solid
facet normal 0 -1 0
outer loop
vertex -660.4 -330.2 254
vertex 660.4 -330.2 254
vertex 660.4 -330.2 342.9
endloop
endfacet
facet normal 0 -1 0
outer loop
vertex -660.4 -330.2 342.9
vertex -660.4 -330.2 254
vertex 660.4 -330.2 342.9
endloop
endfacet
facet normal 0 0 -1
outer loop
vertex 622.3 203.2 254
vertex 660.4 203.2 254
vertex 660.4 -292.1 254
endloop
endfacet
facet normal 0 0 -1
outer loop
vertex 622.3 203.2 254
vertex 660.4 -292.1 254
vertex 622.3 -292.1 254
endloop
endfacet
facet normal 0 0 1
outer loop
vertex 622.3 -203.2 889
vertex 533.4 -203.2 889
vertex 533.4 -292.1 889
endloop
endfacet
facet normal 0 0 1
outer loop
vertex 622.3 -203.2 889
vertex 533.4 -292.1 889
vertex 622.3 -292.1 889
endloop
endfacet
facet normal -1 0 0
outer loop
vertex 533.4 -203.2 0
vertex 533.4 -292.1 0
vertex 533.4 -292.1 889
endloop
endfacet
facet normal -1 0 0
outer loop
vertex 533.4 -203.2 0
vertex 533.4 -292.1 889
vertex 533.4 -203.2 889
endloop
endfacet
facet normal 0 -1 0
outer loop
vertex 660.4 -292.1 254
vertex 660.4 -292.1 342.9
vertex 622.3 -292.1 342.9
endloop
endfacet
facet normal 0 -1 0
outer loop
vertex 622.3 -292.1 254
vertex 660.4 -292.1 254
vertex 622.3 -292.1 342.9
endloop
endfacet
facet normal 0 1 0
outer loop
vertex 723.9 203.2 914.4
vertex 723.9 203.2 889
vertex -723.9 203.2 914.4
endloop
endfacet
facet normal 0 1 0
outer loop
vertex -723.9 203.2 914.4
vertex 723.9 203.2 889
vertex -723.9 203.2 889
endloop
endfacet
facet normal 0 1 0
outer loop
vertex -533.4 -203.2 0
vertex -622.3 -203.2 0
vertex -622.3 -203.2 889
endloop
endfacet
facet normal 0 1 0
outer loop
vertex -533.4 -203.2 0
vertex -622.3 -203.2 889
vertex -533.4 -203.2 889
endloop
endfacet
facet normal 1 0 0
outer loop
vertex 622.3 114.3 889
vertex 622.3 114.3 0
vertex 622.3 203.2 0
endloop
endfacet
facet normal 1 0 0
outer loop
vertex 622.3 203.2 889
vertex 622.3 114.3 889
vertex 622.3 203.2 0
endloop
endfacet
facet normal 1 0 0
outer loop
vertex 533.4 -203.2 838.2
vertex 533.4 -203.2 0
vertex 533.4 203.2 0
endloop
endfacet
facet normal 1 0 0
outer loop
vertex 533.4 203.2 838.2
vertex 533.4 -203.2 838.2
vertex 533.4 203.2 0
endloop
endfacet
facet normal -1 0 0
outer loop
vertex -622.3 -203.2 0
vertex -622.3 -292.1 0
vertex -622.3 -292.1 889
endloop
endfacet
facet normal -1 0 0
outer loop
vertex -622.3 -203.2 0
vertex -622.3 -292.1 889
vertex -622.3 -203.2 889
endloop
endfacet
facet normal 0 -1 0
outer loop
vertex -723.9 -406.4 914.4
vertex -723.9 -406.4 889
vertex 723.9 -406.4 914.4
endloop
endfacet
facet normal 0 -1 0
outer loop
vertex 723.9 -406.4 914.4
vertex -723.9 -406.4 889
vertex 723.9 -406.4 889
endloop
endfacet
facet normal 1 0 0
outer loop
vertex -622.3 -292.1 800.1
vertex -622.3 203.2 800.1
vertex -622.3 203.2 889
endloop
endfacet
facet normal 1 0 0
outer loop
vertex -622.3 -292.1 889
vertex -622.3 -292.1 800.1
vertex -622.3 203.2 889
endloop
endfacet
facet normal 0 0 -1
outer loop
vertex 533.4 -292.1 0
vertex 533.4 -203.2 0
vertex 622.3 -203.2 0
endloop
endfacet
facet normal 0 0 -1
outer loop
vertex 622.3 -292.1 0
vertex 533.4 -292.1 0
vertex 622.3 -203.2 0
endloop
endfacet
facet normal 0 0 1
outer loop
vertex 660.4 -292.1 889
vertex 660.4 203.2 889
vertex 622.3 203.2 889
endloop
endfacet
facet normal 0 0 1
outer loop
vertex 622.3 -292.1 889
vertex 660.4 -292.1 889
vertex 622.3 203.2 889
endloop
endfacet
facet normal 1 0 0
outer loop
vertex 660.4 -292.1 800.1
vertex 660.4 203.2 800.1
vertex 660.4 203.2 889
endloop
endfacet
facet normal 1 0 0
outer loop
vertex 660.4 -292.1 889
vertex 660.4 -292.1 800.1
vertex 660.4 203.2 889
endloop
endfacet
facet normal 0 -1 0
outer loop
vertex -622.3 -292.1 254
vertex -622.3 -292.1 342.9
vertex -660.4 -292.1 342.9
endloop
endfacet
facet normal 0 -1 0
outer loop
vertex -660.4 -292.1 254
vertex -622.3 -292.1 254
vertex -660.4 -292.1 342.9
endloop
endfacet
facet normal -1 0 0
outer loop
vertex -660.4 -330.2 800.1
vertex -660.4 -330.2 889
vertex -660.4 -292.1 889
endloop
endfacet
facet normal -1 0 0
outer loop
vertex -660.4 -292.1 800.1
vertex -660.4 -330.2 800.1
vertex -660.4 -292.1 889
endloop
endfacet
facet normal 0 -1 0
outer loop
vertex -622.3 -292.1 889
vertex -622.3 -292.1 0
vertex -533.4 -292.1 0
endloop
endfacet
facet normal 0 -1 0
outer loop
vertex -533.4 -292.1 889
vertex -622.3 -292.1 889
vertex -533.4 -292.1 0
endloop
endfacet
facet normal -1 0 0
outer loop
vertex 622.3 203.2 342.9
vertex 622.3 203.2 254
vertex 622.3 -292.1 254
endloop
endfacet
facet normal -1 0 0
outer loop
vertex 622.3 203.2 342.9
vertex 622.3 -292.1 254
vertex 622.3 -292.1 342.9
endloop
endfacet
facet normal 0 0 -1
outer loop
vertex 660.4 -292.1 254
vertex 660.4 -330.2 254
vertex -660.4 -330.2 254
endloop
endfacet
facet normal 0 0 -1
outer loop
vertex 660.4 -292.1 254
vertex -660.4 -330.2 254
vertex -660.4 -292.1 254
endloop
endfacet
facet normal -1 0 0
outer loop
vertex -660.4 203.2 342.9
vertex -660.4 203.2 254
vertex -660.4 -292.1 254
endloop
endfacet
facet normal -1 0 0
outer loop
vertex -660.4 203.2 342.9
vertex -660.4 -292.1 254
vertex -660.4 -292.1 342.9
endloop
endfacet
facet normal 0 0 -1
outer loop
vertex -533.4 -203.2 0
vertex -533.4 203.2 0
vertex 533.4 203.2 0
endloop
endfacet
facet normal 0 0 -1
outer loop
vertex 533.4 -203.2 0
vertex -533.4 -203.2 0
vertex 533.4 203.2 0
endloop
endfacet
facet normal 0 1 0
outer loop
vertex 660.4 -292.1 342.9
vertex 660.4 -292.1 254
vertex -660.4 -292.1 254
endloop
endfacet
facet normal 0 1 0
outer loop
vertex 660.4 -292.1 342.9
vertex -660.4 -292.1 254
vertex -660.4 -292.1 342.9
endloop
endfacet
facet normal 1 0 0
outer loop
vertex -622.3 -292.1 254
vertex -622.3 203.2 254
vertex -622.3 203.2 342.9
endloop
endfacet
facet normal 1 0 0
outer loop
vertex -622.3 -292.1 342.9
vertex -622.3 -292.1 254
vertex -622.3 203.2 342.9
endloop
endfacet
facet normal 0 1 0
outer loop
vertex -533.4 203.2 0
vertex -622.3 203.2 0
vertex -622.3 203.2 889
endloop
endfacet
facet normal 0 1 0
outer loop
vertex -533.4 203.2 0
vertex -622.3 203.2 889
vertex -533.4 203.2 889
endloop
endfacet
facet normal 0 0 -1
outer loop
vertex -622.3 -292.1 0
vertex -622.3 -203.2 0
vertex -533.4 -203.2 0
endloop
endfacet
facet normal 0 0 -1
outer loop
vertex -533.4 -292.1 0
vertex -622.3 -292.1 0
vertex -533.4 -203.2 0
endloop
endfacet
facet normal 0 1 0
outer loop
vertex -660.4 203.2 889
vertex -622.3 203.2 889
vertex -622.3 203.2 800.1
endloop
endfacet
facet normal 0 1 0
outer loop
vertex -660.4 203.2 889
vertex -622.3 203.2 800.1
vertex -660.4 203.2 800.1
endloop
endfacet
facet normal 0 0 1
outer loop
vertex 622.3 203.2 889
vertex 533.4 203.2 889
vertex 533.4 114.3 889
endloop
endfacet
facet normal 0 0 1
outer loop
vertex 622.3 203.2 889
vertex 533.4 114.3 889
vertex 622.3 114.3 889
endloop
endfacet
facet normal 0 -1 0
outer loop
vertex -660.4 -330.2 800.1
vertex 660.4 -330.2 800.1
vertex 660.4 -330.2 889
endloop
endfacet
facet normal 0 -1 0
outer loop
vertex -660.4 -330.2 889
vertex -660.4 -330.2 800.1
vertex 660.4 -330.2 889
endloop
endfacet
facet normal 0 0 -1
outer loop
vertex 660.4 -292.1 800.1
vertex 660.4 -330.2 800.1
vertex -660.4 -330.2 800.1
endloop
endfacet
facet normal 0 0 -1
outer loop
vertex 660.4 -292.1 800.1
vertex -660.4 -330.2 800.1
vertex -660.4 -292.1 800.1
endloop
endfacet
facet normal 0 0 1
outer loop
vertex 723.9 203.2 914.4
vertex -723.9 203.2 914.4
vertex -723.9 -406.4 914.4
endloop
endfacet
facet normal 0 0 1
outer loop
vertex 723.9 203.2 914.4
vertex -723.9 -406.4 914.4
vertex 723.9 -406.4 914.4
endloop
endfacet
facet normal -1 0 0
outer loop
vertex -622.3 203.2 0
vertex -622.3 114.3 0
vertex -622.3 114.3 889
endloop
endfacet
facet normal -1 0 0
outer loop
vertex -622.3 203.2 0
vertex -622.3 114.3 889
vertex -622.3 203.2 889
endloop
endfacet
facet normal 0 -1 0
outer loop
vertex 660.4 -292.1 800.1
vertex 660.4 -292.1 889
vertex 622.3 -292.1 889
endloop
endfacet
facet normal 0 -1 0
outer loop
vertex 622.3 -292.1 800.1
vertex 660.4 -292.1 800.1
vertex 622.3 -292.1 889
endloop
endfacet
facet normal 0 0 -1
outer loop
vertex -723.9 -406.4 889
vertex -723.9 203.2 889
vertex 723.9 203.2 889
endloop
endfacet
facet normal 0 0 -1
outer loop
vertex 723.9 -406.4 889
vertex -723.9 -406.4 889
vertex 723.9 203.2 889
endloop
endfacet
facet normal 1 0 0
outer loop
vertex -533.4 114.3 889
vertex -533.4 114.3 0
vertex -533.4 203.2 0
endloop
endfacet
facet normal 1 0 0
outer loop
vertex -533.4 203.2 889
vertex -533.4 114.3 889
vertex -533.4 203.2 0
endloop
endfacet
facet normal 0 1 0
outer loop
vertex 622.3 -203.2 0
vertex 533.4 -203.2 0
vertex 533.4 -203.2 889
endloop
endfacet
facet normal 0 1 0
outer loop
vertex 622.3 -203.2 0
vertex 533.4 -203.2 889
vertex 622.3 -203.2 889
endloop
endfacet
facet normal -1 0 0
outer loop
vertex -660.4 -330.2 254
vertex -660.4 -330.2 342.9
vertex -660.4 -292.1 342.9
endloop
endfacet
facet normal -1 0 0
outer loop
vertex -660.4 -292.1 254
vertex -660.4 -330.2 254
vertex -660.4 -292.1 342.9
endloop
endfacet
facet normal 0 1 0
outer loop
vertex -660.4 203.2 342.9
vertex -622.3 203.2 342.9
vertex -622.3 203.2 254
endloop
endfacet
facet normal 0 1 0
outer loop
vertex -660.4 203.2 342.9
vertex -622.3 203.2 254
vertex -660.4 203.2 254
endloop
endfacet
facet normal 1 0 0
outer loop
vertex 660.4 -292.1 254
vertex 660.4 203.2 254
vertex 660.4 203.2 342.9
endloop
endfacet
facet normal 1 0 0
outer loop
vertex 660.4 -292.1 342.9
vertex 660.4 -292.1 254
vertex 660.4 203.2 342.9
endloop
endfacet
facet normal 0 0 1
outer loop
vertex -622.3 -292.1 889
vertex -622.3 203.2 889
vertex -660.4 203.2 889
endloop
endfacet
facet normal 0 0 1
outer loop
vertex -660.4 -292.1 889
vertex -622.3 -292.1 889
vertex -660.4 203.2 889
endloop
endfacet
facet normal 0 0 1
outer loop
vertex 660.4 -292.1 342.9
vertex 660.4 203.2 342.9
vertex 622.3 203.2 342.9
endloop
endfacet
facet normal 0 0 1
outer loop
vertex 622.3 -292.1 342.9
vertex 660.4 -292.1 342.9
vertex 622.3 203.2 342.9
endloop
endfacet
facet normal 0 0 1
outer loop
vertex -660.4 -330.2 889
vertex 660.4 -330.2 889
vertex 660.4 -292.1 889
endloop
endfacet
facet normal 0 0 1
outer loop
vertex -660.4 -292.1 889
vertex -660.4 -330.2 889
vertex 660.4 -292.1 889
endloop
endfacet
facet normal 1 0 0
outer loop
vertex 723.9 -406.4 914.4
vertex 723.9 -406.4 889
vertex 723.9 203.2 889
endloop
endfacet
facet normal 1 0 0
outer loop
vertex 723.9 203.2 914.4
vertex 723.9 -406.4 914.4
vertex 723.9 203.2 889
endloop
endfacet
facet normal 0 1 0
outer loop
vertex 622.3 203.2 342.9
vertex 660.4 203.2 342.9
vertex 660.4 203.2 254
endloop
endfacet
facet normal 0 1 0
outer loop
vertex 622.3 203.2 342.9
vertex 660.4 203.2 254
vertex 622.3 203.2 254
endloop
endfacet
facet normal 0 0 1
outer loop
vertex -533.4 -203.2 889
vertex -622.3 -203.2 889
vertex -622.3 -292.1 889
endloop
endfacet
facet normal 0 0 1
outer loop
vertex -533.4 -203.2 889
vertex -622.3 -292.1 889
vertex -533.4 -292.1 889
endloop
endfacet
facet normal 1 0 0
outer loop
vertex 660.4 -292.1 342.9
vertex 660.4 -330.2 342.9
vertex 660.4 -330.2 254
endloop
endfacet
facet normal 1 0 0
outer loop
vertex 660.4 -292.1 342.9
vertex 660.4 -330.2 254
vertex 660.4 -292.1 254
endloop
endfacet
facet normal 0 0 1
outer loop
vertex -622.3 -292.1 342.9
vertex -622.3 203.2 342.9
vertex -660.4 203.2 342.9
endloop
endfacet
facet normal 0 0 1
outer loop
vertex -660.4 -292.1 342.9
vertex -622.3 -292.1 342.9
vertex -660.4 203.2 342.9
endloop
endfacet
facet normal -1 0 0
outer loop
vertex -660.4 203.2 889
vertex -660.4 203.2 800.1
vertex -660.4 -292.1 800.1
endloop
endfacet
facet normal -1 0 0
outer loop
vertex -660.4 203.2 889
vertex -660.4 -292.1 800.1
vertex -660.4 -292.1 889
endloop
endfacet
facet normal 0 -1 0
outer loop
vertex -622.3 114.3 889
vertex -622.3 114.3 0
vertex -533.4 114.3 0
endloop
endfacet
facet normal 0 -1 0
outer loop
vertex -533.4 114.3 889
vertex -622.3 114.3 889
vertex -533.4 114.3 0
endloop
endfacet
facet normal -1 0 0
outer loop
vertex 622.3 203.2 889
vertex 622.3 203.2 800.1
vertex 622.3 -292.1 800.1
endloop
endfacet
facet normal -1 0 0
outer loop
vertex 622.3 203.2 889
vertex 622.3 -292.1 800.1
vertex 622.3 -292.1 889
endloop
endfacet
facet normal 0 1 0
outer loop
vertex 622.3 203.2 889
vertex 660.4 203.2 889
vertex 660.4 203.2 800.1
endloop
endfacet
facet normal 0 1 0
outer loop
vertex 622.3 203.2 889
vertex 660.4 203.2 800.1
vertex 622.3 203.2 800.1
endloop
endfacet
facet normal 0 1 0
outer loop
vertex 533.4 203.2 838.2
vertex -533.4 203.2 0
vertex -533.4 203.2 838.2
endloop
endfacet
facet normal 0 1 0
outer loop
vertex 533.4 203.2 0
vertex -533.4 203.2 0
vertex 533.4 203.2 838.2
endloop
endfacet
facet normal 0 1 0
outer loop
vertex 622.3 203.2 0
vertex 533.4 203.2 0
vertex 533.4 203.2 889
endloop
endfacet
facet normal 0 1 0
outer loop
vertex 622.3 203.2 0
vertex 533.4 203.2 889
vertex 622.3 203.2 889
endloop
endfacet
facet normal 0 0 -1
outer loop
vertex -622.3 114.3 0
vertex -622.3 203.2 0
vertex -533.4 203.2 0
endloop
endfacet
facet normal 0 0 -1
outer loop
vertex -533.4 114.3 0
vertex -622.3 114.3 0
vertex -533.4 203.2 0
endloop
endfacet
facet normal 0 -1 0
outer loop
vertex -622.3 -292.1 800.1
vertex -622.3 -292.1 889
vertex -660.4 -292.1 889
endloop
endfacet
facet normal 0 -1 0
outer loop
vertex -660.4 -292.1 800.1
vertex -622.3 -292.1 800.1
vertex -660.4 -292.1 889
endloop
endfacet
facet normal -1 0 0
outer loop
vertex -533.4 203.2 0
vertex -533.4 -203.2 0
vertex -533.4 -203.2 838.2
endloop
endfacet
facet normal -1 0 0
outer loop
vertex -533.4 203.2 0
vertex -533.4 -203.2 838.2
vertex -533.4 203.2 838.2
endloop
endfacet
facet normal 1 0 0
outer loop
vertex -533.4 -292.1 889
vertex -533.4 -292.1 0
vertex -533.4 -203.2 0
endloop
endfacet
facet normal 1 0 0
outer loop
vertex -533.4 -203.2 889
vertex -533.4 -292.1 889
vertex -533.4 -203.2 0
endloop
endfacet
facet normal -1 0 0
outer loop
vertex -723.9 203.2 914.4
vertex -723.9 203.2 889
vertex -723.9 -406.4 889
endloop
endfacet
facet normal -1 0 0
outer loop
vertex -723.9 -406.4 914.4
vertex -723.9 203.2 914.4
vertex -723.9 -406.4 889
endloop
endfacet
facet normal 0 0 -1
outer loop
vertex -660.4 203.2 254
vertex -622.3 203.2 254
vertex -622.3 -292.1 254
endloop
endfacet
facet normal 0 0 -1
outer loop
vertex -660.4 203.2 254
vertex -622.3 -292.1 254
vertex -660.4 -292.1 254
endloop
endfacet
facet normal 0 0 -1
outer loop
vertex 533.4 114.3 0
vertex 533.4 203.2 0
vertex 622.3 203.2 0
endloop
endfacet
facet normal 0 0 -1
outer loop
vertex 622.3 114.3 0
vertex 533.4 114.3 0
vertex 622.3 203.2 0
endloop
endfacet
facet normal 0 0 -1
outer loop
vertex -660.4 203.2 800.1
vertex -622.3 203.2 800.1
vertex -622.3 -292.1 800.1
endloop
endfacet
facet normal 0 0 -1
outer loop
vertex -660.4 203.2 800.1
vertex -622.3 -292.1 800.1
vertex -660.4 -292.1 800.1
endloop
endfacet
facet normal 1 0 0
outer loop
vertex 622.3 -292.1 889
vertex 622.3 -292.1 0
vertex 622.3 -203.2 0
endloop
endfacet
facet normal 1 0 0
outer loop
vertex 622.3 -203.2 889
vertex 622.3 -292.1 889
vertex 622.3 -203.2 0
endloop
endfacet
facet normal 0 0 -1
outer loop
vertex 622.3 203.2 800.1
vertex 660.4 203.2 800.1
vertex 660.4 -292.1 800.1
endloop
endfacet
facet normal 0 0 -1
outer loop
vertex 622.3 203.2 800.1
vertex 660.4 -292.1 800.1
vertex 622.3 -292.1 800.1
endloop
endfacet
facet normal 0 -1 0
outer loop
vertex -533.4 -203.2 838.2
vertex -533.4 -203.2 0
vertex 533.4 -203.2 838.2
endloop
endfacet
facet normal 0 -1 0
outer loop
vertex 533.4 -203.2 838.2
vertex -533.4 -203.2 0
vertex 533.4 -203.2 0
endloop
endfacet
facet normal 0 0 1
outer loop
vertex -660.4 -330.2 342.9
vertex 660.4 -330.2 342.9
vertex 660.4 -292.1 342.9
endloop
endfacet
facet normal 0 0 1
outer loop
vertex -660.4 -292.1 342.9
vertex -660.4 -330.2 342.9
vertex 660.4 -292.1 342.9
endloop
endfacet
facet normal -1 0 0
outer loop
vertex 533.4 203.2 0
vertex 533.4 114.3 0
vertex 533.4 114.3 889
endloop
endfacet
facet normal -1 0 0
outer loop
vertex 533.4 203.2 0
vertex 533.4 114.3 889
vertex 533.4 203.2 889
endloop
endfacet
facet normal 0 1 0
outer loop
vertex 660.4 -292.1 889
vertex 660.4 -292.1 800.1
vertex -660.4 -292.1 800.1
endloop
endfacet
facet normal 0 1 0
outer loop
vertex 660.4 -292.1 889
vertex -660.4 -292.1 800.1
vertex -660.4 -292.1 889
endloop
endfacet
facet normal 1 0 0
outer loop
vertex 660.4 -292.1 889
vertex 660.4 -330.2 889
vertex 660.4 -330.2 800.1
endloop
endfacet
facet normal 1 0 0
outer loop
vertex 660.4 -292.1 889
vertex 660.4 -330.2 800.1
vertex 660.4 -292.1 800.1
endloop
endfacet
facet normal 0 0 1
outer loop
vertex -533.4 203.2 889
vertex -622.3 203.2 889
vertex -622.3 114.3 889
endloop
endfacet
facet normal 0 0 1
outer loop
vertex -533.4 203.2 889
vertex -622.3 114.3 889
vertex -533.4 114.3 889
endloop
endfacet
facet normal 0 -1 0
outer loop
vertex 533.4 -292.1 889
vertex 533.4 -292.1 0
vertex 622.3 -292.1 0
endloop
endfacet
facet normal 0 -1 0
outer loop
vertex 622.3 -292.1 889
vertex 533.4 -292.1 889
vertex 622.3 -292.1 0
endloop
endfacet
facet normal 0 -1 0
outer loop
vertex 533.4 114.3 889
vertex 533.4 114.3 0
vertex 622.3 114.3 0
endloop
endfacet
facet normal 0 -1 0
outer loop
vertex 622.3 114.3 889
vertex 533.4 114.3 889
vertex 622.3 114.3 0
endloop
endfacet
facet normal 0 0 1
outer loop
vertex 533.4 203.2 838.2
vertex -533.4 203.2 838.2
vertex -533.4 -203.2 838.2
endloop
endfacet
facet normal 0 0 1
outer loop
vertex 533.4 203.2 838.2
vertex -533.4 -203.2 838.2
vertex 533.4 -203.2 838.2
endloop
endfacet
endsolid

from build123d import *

# Parameters (mm, degrees)
F0_W     = 1066.8
F0_H     = 406.4
F1_DEPTH = 838.2
F2_W     = 88.9
F2_H     = 88.9
F3_DEPTH = 889
F4_W     = 38.1
F4_H     = 88.9
F5_DEPTH = 495.3
F6_W     = 38.1
F6_H     = 88.9
F7_DEPTH = 1320.8
F8_W     = 88.9
F8_H     = 88.9
F9_DEPTH = 25.4


with BuildPart() as f1:
    # F0 (on Top) → F1 (new body)
    with BuildSketch(Plane.XY):
        Rectangle(F0_W, F0_H)
    extrude(amount=F1_DEPTH)


with BuildPart() as f3:
    # F2 (on Top) → F3 (new body)
    with BuildSketch(Plane.XY):
        with Locations((-577.85, 158.75)):
            Rectangle(F2_W, F2_H)
    extrude(amount=F3_DEPTH)


with BuildPart() as f3b:
    # F2 (on Top) → F3, piece 2 (new body)
    with BuildSketch(Plane.XY):
        with Locations((-577.85, -247.65)):
            Rectangle(F2_W, F2_H)
    extrude(amount=F3_DEPTH)


with BuildPart() as f3c:
    # F2 (on Top) → F3, piece 3 (new body)
    with BuildSketch(Plane.XY):
        with Locations((577.85, -247.65)):
            Rectangle(F2_W, F2_H)
    extrude(amount=F3_DEPTH)


with BuildPart() as f3d:
    # F2 (on Top) → F3, piece 4 (new body)
    with BuildSketch(Plane.XY):
        with Locations((577.85, 158.75)):
            Rectangle(F2_W, F2_H)
    extrude(amount=F3_DEPTH)


with BuildPart() as f5:
    # F4 (on face) → F5 (new body, through all)
    with BuildSketch(Plane(origin=(0, 203.2, 0), x_dir=(-1, 0, 0), z_dir=(0, 1, 0))):
        with Locations((-641.35, 844.55)):
            Rectangle(F4_W, F4_H)
    extrude(amount=-F5_DEPTH)


with BuildPart() as f5b:
    # F4 (on face) → F5, piece 2 (new body, through all)
    with BuildSketch(Plane(origin=(0, 203.2, 0), x_dir=(-1, 0, 0), z_dir=(0, 1, 0))):
        with Locations((-641.35, 298.45)):
            Rectangle(F4_W, F4_H)
    extrude(amount=-F5_DEPTH)


with BuildPart() as f5c:
    # F4 (on face) → F5, piece 3 (new body, through all)
    with BuildSketch(Plane(origin=(0, 203.2, 0), x_dir=(-1, 0, 0), z_dir=(0, 1, 0))):
        with Locations((641.35, 298.45)):
            Rectangle(F4_W, F4_H)
    extrude(amount=-F5_DEPTH)


with BuildPart() as f5d:
    # F4 (on face) → F5, piece 4 (new body, through all)
    with BuildSketch(Plane(origin=(0, 203.2, 0), x_dir=(-1, 0, 0), z_dir=(0, 1, 0))):
        with Locations((641.35, 844.55)):
            Rectangle(F4_W, F4_H)
    extrude(amount=-F5_DEPTH)


with BuildPart() as f7:
    # F6 (on face) → F7 (new body, through all)
    with BuildSketch(Plane.YZ.offset(660.4)):
        with Locations((-311.15, 844.55)):
            Rectangle(F6_W, F6_H)
    extrude(amount=-F7_DEPTH)


with BuildPart() as f7b:
    # F6 (on face) → F7, piece 2 (new body, through all)
    with BuildSketch(Plane.YZ.offset(660.4)):
        with Locations((-311.15, 298.45)):
            Rectangle(F6_W, F6_H)
    extrude(amount=-F7_DEPTH)


with BuildPart() as f9:
    # F8 (on face) → F9 (new body)
    with BuildSketch(Plane.XY.offset(889)):
        Polygon((-622.3, 203.2), (-723.9, 203.2), (-723.9, -406.4), (723.9, -406.4), (723.9, 203.2), (-533.4, 203.2), (-533.4, 114.3), (-622.3, 114.3), align=None)
        with Locations((-577.85, 158.75)):
            Rectangle(F8_W, F8_H)
    extrude(amount=F9_DEPTH)


solid = Compound([f1.part, f3.part, f3b.part, f3c.part, f3d.part, f5.part, f5b.part, f5c.part, f5d.part, f7.part, f7b.part, f9.part])
